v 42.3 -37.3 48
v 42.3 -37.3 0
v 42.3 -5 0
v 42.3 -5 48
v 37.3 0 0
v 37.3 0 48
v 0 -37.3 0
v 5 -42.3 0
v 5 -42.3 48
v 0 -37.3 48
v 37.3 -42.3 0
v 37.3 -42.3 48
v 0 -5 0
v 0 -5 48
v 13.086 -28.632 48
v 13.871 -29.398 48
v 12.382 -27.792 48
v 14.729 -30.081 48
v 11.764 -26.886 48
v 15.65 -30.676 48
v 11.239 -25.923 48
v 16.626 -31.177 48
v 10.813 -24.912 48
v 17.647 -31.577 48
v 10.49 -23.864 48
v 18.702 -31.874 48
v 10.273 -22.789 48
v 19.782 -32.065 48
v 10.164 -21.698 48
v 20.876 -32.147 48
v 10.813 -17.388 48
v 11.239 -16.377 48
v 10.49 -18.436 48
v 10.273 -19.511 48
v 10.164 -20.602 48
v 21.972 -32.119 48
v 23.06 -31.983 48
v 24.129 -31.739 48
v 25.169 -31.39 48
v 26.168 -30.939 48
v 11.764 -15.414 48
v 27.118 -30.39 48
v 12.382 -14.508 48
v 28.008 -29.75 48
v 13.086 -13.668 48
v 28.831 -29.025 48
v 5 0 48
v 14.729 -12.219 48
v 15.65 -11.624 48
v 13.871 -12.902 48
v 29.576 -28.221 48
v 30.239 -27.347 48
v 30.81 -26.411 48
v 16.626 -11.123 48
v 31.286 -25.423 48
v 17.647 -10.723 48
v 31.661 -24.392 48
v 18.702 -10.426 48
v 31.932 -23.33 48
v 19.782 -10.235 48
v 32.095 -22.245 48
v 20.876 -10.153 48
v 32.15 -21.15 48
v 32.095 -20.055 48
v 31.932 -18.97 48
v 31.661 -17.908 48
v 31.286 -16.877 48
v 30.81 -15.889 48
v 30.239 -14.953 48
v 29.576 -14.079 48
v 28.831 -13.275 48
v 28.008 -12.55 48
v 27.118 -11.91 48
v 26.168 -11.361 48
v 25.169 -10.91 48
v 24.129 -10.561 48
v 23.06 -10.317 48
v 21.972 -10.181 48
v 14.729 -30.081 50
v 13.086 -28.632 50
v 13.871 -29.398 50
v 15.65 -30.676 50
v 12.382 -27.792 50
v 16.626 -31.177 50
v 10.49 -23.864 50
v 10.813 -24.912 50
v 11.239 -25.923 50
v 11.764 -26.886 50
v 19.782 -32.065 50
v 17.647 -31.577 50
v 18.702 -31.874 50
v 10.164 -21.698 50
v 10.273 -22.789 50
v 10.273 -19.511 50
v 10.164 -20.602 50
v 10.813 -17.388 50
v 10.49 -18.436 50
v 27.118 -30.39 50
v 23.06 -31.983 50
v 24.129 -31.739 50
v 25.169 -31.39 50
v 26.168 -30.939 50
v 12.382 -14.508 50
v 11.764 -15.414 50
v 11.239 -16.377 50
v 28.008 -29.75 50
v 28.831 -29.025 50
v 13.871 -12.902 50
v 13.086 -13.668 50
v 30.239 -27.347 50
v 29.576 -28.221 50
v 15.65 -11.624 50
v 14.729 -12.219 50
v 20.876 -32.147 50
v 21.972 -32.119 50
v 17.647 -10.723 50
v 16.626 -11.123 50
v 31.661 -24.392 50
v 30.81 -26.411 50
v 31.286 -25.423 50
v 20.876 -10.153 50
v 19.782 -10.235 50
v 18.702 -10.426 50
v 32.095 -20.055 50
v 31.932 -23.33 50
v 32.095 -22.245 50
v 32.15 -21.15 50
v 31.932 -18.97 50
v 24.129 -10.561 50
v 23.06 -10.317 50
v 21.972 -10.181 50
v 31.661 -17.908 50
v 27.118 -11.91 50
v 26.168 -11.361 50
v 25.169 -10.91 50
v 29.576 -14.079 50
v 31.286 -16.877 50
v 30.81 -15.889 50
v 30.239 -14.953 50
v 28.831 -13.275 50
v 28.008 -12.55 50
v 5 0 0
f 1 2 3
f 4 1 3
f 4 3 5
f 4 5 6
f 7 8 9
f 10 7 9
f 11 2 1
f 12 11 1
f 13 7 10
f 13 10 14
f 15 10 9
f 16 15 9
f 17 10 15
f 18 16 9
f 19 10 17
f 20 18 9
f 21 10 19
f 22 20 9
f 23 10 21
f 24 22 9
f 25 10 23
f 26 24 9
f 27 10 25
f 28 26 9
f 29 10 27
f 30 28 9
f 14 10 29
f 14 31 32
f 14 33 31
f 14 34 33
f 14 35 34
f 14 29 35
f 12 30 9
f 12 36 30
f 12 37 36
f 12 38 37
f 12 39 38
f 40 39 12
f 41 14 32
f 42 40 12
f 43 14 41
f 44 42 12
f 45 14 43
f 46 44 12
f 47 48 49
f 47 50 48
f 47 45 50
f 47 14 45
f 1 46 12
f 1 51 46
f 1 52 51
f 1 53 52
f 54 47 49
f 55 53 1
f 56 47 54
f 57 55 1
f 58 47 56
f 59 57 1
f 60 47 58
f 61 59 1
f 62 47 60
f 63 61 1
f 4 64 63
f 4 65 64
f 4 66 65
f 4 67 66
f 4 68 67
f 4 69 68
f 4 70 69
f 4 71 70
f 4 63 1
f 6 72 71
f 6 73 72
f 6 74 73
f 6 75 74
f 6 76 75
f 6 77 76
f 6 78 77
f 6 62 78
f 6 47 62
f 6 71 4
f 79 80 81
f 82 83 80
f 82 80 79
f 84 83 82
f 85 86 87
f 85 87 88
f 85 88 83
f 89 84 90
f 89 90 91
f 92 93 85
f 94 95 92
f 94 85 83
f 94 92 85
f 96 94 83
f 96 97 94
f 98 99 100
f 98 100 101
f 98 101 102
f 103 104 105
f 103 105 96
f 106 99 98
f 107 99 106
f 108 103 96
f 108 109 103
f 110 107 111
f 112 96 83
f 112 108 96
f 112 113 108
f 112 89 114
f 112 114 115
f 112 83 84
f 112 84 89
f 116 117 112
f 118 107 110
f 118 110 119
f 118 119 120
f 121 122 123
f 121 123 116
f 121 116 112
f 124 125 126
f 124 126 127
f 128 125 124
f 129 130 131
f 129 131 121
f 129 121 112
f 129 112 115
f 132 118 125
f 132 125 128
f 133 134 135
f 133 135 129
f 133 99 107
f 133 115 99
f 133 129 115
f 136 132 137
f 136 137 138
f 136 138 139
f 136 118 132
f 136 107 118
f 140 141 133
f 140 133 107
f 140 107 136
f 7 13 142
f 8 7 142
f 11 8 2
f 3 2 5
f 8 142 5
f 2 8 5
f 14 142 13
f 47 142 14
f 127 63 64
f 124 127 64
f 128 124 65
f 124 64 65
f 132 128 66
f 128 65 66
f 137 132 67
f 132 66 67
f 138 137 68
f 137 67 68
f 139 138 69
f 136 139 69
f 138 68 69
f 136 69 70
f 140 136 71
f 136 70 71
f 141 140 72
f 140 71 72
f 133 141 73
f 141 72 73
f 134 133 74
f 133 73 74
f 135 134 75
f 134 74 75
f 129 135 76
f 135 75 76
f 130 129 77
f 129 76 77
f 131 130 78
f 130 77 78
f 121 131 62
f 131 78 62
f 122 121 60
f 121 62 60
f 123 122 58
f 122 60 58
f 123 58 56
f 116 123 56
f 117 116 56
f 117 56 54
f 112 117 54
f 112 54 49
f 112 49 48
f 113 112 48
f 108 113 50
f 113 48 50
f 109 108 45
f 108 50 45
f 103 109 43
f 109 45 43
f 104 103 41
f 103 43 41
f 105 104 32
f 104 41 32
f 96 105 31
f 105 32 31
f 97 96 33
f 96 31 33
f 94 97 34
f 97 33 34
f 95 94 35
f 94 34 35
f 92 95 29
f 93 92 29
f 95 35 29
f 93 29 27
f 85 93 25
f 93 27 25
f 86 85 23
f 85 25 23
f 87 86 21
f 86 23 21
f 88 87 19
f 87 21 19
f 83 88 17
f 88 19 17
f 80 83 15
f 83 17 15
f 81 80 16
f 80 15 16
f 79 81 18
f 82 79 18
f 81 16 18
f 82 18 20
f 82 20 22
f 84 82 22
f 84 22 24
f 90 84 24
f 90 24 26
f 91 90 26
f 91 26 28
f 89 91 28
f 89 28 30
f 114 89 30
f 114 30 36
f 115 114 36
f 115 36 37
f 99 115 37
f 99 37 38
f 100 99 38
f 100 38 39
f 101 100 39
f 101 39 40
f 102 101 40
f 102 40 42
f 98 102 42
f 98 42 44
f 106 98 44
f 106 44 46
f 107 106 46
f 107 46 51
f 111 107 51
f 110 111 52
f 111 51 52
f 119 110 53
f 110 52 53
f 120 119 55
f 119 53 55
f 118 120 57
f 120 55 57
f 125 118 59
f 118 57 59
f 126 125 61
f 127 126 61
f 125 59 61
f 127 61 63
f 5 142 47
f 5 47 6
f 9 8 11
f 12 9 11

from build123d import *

# Parameters (mm, degrees)
SKETCH1_W           = 42.3
SKETCH1_H           = 42.3
BOSS_EXTRUDE1_DEPTH = 48
SKETCH2_R           = 11
BOSS_EXTRUDE2_DEPTH = 2
CHAMFER1_SIZE       = 5


with BuildPart() as part:
    # Sketch1 → Boss-Extrude1 (new body)
    with BuildSketch(Plane.XY):
        with Locations((21.15, -21.15)):
            Rectangle(SKETCH1_W, SKETCH1_H)
    extrude(amount=BOSS_EXTRUDE1_DEPTH)

    # Sketch2 → Boss-Extrude2 (add)
    with BuildSketch(Plane.XY.offset(48)):
        with Locations((21.15, -21.15)):
            Circle(SKETCH2_R)
    extrude(amount=BOSS_EXTRUDE2_DEPTH)

    # Chamfer1
    chamfer1_edges = [part.edges().sort_by_distance(p)[0] for p in [
        (0, 0, 24),
        (42.3, 0, 24),
        (42.3, -42.3, 24),
        (0, -42.3, 24),
    ]]
    chamfer(chamfer1_edges, length=CHAMFER1_SIZE)


solid = part.part
